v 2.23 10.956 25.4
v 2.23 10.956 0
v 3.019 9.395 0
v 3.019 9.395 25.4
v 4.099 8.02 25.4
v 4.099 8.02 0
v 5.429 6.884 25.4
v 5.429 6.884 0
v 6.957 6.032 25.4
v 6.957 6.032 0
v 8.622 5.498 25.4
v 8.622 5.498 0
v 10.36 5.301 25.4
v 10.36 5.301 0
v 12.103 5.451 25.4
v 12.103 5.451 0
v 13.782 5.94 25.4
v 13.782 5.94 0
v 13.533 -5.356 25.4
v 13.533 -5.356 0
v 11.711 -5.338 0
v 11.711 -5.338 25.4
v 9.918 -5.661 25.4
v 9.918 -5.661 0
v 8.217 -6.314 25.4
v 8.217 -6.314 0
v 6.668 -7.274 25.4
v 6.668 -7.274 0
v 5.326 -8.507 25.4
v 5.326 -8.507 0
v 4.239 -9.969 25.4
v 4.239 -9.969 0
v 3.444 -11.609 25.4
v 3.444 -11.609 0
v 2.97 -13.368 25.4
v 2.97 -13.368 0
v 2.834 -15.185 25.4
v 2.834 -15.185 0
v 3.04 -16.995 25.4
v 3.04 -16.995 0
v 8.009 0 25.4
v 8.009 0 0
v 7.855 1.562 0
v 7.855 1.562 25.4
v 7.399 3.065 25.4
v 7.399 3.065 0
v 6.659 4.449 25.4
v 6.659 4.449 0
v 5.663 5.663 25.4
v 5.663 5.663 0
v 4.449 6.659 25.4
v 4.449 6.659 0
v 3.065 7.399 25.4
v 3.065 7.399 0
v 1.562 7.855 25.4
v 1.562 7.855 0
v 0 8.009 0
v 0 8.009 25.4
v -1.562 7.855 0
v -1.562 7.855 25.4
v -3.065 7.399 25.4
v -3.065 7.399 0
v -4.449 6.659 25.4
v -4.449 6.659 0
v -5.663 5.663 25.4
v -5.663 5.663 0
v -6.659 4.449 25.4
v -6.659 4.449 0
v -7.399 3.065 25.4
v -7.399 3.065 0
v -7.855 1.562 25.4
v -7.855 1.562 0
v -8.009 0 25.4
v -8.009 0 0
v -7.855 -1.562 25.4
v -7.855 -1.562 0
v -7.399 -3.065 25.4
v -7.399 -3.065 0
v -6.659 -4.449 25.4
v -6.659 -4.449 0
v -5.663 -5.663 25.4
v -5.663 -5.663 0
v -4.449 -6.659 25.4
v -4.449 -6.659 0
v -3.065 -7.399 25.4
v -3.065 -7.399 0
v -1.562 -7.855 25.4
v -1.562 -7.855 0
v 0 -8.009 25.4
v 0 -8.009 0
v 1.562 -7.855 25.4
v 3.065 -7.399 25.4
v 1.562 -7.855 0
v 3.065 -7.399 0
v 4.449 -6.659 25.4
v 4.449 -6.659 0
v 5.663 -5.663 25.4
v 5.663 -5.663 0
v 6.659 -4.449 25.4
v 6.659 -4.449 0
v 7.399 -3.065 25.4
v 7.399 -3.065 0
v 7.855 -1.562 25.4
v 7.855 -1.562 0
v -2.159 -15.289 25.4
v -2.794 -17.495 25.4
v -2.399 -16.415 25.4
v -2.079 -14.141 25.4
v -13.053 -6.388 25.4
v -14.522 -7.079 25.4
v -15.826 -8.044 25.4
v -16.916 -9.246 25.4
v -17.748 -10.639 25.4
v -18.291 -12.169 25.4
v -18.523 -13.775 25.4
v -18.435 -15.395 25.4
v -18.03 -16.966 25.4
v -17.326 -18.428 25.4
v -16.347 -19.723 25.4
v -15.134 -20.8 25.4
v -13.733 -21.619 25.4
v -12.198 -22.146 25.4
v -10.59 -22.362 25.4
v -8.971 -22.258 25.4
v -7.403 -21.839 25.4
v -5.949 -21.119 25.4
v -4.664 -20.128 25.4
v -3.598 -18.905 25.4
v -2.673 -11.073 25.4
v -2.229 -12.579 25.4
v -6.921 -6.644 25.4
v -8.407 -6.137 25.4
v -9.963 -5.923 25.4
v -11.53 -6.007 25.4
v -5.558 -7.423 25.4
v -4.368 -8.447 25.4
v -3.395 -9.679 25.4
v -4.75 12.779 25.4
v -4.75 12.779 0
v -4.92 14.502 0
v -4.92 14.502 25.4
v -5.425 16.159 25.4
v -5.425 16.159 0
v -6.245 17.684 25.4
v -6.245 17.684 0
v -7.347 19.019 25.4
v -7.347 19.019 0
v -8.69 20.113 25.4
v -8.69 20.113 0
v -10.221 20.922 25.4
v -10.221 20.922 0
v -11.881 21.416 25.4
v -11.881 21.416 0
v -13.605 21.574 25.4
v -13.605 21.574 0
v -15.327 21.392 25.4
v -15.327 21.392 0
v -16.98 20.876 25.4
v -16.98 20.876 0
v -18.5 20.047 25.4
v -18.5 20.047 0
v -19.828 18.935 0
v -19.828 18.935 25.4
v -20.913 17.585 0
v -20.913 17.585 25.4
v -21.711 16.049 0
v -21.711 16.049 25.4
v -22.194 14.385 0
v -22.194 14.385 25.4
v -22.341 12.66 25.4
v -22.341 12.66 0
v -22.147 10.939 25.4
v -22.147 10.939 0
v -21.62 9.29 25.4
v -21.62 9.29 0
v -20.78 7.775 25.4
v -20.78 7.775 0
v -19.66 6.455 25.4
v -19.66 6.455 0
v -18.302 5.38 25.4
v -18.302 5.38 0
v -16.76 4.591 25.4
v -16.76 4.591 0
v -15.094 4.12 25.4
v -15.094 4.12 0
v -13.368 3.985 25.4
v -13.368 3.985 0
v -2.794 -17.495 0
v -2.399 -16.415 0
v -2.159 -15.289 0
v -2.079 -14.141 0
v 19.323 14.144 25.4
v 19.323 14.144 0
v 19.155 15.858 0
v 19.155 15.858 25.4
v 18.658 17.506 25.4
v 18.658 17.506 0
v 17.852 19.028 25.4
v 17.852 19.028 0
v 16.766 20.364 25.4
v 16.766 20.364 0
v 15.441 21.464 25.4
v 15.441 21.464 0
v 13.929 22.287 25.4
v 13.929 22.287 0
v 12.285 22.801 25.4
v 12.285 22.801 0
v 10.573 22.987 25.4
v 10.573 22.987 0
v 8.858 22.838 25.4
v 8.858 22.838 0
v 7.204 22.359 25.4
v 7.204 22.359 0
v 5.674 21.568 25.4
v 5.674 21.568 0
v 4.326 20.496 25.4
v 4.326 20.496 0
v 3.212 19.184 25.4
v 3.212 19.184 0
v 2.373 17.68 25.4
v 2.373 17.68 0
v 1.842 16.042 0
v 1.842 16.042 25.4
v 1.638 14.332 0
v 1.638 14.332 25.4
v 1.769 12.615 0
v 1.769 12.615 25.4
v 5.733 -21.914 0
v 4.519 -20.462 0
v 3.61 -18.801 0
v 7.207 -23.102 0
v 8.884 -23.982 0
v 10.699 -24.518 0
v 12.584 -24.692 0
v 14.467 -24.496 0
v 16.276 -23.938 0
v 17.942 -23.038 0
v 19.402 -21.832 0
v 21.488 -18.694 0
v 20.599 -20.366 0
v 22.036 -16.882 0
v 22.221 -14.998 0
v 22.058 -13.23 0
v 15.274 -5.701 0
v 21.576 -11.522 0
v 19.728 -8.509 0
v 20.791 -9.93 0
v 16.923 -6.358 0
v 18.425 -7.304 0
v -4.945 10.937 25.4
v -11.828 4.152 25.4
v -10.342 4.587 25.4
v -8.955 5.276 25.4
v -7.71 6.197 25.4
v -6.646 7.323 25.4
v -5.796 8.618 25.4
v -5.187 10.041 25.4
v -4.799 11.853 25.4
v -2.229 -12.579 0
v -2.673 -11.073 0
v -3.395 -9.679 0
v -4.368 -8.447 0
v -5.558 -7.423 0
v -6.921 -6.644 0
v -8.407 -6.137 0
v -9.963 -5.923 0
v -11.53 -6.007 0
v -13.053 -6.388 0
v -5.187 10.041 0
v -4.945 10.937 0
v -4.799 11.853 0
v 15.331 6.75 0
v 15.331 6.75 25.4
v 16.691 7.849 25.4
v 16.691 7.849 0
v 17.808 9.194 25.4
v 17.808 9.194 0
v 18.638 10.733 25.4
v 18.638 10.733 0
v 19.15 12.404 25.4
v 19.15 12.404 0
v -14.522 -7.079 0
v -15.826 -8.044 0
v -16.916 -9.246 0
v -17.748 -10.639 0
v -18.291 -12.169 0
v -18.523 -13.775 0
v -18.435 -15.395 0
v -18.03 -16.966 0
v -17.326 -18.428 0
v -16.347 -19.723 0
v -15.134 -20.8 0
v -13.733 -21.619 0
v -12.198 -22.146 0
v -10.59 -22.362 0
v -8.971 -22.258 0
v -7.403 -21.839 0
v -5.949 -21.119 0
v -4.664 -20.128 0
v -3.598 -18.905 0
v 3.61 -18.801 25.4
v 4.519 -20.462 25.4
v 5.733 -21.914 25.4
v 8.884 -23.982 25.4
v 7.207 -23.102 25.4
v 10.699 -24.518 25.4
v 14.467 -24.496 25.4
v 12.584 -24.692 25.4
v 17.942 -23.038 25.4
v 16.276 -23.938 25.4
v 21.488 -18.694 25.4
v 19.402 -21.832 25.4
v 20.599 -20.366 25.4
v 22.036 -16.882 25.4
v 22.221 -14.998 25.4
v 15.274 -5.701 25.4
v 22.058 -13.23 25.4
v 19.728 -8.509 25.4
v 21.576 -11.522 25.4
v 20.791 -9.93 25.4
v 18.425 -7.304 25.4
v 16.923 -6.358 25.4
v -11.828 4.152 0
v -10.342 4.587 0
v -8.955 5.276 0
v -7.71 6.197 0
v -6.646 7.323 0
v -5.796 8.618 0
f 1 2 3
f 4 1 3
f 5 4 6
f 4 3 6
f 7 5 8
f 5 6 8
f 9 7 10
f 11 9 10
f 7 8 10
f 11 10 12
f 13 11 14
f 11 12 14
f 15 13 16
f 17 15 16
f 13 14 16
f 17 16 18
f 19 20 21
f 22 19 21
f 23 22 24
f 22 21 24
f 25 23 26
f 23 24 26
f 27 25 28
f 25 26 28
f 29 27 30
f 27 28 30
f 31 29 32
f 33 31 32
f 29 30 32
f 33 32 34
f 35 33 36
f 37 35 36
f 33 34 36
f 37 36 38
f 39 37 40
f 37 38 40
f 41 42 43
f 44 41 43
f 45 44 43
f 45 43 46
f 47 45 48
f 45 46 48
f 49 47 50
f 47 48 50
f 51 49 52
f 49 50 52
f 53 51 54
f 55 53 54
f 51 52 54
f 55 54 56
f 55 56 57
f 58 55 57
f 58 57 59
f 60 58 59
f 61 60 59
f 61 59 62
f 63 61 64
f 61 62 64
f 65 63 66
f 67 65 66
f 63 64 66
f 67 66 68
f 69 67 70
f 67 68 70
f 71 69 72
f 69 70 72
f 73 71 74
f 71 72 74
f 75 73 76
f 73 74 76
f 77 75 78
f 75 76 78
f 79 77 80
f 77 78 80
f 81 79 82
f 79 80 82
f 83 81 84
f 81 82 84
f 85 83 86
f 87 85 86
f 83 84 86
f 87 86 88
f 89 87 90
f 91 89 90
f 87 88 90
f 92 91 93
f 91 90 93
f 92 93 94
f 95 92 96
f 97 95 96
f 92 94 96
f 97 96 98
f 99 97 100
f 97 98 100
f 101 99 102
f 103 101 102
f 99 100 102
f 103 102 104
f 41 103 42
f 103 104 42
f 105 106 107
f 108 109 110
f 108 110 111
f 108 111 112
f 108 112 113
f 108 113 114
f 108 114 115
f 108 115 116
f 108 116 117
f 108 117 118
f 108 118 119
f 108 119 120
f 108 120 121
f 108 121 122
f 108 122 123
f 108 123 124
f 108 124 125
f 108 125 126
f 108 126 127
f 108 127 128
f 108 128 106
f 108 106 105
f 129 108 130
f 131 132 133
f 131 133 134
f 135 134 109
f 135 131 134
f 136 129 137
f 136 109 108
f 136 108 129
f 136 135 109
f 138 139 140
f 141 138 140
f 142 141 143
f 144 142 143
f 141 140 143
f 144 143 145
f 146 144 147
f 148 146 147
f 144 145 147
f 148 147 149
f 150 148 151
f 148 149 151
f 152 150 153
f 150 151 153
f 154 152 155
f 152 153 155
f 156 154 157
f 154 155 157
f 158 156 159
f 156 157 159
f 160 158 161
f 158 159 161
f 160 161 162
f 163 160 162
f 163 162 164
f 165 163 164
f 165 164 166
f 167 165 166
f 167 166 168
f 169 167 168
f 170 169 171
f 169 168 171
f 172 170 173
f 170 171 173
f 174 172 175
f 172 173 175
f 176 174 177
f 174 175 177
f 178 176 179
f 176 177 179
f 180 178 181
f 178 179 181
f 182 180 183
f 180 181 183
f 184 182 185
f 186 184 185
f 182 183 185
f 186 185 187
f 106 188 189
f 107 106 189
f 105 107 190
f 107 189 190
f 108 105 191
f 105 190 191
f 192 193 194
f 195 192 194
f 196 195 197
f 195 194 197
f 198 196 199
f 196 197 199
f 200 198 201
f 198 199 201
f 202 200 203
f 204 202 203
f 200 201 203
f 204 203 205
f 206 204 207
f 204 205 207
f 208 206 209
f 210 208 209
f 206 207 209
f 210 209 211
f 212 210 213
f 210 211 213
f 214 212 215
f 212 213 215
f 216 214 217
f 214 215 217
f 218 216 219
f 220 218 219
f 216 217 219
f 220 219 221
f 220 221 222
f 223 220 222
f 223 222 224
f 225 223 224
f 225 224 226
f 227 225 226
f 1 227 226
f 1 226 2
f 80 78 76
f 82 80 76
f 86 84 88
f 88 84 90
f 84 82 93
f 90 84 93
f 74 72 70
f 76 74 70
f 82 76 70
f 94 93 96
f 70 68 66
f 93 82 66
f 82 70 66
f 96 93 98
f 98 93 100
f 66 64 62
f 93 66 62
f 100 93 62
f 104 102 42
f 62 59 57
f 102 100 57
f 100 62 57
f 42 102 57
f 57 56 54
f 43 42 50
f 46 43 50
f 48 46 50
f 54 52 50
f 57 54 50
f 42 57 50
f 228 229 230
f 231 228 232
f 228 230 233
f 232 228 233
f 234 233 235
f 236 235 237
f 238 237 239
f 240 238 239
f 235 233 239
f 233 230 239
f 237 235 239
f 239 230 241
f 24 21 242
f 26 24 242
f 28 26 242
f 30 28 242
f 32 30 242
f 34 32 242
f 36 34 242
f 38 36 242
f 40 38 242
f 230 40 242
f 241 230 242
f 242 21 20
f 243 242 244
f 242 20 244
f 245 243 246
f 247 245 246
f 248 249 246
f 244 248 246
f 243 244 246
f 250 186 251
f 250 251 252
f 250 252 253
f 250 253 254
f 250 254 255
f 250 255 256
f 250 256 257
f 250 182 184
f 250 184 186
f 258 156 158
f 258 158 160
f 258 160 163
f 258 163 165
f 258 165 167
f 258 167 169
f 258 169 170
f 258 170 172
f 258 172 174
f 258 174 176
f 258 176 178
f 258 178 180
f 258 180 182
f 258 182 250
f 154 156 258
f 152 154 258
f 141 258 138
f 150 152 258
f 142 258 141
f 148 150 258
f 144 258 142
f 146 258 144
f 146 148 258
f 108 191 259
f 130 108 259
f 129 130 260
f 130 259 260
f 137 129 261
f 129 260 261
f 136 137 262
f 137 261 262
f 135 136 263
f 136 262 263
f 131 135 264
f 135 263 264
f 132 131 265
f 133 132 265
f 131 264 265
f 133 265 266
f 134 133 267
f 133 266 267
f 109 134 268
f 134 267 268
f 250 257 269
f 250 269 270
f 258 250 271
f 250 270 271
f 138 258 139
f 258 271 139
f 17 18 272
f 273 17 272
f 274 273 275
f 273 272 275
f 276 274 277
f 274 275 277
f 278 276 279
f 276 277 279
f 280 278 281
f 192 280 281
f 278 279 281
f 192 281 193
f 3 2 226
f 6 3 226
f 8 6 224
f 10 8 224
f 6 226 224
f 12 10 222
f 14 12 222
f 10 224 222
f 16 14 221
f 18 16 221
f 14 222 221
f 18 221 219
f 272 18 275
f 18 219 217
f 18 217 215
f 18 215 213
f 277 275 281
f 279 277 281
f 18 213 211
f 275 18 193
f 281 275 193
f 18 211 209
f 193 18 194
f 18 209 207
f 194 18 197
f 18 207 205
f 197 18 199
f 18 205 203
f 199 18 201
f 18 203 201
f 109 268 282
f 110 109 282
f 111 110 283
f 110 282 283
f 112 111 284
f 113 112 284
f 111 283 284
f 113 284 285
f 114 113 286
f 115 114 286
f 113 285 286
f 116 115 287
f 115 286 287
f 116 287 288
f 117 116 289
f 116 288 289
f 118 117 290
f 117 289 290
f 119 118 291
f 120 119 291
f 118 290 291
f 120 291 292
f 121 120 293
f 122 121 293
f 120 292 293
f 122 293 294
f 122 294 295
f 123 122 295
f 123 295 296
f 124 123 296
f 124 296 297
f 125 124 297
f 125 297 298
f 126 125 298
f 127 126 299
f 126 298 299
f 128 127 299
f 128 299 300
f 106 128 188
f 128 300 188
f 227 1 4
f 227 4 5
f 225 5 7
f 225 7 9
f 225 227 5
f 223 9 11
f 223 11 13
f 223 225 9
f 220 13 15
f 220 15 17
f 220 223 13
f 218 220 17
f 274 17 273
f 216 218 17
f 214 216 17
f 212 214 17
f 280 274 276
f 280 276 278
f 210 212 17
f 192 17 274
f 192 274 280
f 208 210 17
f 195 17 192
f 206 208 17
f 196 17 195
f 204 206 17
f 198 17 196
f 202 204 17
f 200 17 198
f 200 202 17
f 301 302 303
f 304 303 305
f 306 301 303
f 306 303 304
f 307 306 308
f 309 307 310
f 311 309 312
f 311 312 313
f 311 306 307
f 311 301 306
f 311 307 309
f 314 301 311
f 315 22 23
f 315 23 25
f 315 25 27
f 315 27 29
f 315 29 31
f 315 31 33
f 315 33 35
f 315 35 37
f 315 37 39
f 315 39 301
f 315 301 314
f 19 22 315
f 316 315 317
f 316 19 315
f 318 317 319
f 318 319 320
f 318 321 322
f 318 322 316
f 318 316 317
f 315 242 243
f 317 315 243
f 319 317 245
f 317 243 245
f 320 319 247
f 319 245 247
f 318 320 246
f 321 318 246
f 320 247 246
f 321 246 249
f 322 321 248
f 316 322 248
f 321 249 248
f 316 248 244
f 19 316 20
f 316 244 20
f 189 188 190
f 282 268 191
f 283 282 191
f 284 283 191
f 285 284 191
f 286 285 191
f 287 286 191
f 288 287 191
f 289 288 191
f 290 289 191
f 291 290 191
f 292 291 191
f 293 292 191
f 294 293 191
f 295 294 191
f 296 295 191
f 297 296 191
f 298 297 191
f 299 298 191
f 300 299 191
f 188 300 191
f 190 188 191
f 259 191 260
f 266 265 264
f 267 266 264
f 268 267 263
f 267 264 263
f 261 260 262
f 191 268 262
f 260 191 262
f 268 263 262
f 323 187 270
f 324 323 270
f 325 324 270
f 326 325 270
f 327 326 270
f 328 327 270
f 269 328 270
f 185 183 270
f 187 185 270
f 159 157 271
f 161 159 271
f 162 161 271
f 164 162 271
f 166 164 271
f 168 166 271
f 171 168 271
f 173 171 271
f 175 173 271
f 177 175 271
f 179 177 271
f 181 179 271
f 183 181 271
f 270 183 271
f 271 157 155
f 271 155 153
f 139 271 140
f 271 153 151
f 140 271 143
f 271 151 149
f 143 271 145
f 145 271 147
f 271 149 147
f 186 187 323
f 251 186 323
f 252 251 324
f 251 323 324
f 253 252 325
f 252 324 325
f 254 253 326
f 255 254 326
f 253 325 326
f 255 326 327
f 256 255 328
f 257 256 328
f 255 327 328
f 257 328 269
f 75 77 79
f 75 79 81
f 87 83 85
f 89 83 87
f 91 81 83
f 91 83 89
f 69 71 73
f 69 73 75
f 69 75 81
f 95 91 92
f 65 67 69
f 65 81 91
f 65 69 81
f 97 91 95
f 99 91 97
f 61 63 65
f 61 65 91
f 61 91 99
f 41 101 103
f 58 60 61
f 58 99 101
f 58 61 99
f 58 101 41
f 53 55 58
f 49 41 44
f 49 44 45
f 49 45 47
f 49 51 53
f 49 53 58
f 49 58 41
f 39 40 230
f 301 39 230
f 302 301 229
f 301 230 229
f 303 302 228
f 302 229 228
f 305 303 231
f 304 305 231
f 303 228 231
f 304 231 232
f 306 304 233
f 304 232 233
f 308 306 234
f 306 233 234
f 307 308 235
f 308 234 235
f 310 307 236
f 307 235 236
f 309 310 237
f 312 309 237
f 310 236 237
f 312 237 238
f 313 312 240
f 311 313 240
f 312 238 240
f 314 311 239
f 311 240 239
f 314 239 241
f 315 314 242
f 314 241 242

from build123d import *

# Parameters (mm, degrees)
F0_R     = 8.008553
F2_DEPTH = 25.4


with BuildPart() as f2:
    # F0 (on Top) → F2 (new body)
    with BuildSketch(Plane.XY):
        with BuildLine():
            ThreePointArc((-13.367748, 3.984637), (-8.312192, 5.709303), (-5.186786, 10.041156))
            ThreePointArc((-5.186786, 10.041156), (-4.859822, 11.392638), (-4.749918, 12.778758))
            ThreePointArc((-4.749918, 12.778758), (-19.82815, 18.935127), (-13.367748, 3.984637))
        make_face()
        with BuildLine():
            ThreePointArc((13.781839, 5.940213), (17.807706, 9.194119), (19.32268, 14.143903))
            ThreePointArc((19.32268, 14.143903), (8.857815, 22.837567), (2.230051, 10.956239))
            ThreePointArc((2.230051, 10.956239), (6.956804, 6.032079), (13.781839, 5.940213))
        make_face()
        with BuildLine():
            ThreePointArc((22.220862, -14.997891), (19.728442, -8.50851), (13.5328, -5.356013))
            ThreePointArc((13.5328, -5.356013), (5.326167, -8.507008), (3.040421, -16.995408))
            ThreePointArc((3.040421, -16.995408), (13.530788, -24.639978), (22.220862, -14.997891))
        make_face()
        with BuildLine():
            ThreePointArc((-2.078872, -14.141371), (-5.55837, -7.422916), (-13.053286, -6.388127))
            ThreePointArc((-13.053286, -6.388127), (-16.347493, -19.722873), (-2.793695, -17.495364))
            ThreePointArc((-2.793695, -17.495364), (-2.259562, -15.856031), (-2.078872, -14.141371))
        make_face()
        Circle(F0_R)
    extrude(amount=F2_DEPTH)


solid = f2.part
